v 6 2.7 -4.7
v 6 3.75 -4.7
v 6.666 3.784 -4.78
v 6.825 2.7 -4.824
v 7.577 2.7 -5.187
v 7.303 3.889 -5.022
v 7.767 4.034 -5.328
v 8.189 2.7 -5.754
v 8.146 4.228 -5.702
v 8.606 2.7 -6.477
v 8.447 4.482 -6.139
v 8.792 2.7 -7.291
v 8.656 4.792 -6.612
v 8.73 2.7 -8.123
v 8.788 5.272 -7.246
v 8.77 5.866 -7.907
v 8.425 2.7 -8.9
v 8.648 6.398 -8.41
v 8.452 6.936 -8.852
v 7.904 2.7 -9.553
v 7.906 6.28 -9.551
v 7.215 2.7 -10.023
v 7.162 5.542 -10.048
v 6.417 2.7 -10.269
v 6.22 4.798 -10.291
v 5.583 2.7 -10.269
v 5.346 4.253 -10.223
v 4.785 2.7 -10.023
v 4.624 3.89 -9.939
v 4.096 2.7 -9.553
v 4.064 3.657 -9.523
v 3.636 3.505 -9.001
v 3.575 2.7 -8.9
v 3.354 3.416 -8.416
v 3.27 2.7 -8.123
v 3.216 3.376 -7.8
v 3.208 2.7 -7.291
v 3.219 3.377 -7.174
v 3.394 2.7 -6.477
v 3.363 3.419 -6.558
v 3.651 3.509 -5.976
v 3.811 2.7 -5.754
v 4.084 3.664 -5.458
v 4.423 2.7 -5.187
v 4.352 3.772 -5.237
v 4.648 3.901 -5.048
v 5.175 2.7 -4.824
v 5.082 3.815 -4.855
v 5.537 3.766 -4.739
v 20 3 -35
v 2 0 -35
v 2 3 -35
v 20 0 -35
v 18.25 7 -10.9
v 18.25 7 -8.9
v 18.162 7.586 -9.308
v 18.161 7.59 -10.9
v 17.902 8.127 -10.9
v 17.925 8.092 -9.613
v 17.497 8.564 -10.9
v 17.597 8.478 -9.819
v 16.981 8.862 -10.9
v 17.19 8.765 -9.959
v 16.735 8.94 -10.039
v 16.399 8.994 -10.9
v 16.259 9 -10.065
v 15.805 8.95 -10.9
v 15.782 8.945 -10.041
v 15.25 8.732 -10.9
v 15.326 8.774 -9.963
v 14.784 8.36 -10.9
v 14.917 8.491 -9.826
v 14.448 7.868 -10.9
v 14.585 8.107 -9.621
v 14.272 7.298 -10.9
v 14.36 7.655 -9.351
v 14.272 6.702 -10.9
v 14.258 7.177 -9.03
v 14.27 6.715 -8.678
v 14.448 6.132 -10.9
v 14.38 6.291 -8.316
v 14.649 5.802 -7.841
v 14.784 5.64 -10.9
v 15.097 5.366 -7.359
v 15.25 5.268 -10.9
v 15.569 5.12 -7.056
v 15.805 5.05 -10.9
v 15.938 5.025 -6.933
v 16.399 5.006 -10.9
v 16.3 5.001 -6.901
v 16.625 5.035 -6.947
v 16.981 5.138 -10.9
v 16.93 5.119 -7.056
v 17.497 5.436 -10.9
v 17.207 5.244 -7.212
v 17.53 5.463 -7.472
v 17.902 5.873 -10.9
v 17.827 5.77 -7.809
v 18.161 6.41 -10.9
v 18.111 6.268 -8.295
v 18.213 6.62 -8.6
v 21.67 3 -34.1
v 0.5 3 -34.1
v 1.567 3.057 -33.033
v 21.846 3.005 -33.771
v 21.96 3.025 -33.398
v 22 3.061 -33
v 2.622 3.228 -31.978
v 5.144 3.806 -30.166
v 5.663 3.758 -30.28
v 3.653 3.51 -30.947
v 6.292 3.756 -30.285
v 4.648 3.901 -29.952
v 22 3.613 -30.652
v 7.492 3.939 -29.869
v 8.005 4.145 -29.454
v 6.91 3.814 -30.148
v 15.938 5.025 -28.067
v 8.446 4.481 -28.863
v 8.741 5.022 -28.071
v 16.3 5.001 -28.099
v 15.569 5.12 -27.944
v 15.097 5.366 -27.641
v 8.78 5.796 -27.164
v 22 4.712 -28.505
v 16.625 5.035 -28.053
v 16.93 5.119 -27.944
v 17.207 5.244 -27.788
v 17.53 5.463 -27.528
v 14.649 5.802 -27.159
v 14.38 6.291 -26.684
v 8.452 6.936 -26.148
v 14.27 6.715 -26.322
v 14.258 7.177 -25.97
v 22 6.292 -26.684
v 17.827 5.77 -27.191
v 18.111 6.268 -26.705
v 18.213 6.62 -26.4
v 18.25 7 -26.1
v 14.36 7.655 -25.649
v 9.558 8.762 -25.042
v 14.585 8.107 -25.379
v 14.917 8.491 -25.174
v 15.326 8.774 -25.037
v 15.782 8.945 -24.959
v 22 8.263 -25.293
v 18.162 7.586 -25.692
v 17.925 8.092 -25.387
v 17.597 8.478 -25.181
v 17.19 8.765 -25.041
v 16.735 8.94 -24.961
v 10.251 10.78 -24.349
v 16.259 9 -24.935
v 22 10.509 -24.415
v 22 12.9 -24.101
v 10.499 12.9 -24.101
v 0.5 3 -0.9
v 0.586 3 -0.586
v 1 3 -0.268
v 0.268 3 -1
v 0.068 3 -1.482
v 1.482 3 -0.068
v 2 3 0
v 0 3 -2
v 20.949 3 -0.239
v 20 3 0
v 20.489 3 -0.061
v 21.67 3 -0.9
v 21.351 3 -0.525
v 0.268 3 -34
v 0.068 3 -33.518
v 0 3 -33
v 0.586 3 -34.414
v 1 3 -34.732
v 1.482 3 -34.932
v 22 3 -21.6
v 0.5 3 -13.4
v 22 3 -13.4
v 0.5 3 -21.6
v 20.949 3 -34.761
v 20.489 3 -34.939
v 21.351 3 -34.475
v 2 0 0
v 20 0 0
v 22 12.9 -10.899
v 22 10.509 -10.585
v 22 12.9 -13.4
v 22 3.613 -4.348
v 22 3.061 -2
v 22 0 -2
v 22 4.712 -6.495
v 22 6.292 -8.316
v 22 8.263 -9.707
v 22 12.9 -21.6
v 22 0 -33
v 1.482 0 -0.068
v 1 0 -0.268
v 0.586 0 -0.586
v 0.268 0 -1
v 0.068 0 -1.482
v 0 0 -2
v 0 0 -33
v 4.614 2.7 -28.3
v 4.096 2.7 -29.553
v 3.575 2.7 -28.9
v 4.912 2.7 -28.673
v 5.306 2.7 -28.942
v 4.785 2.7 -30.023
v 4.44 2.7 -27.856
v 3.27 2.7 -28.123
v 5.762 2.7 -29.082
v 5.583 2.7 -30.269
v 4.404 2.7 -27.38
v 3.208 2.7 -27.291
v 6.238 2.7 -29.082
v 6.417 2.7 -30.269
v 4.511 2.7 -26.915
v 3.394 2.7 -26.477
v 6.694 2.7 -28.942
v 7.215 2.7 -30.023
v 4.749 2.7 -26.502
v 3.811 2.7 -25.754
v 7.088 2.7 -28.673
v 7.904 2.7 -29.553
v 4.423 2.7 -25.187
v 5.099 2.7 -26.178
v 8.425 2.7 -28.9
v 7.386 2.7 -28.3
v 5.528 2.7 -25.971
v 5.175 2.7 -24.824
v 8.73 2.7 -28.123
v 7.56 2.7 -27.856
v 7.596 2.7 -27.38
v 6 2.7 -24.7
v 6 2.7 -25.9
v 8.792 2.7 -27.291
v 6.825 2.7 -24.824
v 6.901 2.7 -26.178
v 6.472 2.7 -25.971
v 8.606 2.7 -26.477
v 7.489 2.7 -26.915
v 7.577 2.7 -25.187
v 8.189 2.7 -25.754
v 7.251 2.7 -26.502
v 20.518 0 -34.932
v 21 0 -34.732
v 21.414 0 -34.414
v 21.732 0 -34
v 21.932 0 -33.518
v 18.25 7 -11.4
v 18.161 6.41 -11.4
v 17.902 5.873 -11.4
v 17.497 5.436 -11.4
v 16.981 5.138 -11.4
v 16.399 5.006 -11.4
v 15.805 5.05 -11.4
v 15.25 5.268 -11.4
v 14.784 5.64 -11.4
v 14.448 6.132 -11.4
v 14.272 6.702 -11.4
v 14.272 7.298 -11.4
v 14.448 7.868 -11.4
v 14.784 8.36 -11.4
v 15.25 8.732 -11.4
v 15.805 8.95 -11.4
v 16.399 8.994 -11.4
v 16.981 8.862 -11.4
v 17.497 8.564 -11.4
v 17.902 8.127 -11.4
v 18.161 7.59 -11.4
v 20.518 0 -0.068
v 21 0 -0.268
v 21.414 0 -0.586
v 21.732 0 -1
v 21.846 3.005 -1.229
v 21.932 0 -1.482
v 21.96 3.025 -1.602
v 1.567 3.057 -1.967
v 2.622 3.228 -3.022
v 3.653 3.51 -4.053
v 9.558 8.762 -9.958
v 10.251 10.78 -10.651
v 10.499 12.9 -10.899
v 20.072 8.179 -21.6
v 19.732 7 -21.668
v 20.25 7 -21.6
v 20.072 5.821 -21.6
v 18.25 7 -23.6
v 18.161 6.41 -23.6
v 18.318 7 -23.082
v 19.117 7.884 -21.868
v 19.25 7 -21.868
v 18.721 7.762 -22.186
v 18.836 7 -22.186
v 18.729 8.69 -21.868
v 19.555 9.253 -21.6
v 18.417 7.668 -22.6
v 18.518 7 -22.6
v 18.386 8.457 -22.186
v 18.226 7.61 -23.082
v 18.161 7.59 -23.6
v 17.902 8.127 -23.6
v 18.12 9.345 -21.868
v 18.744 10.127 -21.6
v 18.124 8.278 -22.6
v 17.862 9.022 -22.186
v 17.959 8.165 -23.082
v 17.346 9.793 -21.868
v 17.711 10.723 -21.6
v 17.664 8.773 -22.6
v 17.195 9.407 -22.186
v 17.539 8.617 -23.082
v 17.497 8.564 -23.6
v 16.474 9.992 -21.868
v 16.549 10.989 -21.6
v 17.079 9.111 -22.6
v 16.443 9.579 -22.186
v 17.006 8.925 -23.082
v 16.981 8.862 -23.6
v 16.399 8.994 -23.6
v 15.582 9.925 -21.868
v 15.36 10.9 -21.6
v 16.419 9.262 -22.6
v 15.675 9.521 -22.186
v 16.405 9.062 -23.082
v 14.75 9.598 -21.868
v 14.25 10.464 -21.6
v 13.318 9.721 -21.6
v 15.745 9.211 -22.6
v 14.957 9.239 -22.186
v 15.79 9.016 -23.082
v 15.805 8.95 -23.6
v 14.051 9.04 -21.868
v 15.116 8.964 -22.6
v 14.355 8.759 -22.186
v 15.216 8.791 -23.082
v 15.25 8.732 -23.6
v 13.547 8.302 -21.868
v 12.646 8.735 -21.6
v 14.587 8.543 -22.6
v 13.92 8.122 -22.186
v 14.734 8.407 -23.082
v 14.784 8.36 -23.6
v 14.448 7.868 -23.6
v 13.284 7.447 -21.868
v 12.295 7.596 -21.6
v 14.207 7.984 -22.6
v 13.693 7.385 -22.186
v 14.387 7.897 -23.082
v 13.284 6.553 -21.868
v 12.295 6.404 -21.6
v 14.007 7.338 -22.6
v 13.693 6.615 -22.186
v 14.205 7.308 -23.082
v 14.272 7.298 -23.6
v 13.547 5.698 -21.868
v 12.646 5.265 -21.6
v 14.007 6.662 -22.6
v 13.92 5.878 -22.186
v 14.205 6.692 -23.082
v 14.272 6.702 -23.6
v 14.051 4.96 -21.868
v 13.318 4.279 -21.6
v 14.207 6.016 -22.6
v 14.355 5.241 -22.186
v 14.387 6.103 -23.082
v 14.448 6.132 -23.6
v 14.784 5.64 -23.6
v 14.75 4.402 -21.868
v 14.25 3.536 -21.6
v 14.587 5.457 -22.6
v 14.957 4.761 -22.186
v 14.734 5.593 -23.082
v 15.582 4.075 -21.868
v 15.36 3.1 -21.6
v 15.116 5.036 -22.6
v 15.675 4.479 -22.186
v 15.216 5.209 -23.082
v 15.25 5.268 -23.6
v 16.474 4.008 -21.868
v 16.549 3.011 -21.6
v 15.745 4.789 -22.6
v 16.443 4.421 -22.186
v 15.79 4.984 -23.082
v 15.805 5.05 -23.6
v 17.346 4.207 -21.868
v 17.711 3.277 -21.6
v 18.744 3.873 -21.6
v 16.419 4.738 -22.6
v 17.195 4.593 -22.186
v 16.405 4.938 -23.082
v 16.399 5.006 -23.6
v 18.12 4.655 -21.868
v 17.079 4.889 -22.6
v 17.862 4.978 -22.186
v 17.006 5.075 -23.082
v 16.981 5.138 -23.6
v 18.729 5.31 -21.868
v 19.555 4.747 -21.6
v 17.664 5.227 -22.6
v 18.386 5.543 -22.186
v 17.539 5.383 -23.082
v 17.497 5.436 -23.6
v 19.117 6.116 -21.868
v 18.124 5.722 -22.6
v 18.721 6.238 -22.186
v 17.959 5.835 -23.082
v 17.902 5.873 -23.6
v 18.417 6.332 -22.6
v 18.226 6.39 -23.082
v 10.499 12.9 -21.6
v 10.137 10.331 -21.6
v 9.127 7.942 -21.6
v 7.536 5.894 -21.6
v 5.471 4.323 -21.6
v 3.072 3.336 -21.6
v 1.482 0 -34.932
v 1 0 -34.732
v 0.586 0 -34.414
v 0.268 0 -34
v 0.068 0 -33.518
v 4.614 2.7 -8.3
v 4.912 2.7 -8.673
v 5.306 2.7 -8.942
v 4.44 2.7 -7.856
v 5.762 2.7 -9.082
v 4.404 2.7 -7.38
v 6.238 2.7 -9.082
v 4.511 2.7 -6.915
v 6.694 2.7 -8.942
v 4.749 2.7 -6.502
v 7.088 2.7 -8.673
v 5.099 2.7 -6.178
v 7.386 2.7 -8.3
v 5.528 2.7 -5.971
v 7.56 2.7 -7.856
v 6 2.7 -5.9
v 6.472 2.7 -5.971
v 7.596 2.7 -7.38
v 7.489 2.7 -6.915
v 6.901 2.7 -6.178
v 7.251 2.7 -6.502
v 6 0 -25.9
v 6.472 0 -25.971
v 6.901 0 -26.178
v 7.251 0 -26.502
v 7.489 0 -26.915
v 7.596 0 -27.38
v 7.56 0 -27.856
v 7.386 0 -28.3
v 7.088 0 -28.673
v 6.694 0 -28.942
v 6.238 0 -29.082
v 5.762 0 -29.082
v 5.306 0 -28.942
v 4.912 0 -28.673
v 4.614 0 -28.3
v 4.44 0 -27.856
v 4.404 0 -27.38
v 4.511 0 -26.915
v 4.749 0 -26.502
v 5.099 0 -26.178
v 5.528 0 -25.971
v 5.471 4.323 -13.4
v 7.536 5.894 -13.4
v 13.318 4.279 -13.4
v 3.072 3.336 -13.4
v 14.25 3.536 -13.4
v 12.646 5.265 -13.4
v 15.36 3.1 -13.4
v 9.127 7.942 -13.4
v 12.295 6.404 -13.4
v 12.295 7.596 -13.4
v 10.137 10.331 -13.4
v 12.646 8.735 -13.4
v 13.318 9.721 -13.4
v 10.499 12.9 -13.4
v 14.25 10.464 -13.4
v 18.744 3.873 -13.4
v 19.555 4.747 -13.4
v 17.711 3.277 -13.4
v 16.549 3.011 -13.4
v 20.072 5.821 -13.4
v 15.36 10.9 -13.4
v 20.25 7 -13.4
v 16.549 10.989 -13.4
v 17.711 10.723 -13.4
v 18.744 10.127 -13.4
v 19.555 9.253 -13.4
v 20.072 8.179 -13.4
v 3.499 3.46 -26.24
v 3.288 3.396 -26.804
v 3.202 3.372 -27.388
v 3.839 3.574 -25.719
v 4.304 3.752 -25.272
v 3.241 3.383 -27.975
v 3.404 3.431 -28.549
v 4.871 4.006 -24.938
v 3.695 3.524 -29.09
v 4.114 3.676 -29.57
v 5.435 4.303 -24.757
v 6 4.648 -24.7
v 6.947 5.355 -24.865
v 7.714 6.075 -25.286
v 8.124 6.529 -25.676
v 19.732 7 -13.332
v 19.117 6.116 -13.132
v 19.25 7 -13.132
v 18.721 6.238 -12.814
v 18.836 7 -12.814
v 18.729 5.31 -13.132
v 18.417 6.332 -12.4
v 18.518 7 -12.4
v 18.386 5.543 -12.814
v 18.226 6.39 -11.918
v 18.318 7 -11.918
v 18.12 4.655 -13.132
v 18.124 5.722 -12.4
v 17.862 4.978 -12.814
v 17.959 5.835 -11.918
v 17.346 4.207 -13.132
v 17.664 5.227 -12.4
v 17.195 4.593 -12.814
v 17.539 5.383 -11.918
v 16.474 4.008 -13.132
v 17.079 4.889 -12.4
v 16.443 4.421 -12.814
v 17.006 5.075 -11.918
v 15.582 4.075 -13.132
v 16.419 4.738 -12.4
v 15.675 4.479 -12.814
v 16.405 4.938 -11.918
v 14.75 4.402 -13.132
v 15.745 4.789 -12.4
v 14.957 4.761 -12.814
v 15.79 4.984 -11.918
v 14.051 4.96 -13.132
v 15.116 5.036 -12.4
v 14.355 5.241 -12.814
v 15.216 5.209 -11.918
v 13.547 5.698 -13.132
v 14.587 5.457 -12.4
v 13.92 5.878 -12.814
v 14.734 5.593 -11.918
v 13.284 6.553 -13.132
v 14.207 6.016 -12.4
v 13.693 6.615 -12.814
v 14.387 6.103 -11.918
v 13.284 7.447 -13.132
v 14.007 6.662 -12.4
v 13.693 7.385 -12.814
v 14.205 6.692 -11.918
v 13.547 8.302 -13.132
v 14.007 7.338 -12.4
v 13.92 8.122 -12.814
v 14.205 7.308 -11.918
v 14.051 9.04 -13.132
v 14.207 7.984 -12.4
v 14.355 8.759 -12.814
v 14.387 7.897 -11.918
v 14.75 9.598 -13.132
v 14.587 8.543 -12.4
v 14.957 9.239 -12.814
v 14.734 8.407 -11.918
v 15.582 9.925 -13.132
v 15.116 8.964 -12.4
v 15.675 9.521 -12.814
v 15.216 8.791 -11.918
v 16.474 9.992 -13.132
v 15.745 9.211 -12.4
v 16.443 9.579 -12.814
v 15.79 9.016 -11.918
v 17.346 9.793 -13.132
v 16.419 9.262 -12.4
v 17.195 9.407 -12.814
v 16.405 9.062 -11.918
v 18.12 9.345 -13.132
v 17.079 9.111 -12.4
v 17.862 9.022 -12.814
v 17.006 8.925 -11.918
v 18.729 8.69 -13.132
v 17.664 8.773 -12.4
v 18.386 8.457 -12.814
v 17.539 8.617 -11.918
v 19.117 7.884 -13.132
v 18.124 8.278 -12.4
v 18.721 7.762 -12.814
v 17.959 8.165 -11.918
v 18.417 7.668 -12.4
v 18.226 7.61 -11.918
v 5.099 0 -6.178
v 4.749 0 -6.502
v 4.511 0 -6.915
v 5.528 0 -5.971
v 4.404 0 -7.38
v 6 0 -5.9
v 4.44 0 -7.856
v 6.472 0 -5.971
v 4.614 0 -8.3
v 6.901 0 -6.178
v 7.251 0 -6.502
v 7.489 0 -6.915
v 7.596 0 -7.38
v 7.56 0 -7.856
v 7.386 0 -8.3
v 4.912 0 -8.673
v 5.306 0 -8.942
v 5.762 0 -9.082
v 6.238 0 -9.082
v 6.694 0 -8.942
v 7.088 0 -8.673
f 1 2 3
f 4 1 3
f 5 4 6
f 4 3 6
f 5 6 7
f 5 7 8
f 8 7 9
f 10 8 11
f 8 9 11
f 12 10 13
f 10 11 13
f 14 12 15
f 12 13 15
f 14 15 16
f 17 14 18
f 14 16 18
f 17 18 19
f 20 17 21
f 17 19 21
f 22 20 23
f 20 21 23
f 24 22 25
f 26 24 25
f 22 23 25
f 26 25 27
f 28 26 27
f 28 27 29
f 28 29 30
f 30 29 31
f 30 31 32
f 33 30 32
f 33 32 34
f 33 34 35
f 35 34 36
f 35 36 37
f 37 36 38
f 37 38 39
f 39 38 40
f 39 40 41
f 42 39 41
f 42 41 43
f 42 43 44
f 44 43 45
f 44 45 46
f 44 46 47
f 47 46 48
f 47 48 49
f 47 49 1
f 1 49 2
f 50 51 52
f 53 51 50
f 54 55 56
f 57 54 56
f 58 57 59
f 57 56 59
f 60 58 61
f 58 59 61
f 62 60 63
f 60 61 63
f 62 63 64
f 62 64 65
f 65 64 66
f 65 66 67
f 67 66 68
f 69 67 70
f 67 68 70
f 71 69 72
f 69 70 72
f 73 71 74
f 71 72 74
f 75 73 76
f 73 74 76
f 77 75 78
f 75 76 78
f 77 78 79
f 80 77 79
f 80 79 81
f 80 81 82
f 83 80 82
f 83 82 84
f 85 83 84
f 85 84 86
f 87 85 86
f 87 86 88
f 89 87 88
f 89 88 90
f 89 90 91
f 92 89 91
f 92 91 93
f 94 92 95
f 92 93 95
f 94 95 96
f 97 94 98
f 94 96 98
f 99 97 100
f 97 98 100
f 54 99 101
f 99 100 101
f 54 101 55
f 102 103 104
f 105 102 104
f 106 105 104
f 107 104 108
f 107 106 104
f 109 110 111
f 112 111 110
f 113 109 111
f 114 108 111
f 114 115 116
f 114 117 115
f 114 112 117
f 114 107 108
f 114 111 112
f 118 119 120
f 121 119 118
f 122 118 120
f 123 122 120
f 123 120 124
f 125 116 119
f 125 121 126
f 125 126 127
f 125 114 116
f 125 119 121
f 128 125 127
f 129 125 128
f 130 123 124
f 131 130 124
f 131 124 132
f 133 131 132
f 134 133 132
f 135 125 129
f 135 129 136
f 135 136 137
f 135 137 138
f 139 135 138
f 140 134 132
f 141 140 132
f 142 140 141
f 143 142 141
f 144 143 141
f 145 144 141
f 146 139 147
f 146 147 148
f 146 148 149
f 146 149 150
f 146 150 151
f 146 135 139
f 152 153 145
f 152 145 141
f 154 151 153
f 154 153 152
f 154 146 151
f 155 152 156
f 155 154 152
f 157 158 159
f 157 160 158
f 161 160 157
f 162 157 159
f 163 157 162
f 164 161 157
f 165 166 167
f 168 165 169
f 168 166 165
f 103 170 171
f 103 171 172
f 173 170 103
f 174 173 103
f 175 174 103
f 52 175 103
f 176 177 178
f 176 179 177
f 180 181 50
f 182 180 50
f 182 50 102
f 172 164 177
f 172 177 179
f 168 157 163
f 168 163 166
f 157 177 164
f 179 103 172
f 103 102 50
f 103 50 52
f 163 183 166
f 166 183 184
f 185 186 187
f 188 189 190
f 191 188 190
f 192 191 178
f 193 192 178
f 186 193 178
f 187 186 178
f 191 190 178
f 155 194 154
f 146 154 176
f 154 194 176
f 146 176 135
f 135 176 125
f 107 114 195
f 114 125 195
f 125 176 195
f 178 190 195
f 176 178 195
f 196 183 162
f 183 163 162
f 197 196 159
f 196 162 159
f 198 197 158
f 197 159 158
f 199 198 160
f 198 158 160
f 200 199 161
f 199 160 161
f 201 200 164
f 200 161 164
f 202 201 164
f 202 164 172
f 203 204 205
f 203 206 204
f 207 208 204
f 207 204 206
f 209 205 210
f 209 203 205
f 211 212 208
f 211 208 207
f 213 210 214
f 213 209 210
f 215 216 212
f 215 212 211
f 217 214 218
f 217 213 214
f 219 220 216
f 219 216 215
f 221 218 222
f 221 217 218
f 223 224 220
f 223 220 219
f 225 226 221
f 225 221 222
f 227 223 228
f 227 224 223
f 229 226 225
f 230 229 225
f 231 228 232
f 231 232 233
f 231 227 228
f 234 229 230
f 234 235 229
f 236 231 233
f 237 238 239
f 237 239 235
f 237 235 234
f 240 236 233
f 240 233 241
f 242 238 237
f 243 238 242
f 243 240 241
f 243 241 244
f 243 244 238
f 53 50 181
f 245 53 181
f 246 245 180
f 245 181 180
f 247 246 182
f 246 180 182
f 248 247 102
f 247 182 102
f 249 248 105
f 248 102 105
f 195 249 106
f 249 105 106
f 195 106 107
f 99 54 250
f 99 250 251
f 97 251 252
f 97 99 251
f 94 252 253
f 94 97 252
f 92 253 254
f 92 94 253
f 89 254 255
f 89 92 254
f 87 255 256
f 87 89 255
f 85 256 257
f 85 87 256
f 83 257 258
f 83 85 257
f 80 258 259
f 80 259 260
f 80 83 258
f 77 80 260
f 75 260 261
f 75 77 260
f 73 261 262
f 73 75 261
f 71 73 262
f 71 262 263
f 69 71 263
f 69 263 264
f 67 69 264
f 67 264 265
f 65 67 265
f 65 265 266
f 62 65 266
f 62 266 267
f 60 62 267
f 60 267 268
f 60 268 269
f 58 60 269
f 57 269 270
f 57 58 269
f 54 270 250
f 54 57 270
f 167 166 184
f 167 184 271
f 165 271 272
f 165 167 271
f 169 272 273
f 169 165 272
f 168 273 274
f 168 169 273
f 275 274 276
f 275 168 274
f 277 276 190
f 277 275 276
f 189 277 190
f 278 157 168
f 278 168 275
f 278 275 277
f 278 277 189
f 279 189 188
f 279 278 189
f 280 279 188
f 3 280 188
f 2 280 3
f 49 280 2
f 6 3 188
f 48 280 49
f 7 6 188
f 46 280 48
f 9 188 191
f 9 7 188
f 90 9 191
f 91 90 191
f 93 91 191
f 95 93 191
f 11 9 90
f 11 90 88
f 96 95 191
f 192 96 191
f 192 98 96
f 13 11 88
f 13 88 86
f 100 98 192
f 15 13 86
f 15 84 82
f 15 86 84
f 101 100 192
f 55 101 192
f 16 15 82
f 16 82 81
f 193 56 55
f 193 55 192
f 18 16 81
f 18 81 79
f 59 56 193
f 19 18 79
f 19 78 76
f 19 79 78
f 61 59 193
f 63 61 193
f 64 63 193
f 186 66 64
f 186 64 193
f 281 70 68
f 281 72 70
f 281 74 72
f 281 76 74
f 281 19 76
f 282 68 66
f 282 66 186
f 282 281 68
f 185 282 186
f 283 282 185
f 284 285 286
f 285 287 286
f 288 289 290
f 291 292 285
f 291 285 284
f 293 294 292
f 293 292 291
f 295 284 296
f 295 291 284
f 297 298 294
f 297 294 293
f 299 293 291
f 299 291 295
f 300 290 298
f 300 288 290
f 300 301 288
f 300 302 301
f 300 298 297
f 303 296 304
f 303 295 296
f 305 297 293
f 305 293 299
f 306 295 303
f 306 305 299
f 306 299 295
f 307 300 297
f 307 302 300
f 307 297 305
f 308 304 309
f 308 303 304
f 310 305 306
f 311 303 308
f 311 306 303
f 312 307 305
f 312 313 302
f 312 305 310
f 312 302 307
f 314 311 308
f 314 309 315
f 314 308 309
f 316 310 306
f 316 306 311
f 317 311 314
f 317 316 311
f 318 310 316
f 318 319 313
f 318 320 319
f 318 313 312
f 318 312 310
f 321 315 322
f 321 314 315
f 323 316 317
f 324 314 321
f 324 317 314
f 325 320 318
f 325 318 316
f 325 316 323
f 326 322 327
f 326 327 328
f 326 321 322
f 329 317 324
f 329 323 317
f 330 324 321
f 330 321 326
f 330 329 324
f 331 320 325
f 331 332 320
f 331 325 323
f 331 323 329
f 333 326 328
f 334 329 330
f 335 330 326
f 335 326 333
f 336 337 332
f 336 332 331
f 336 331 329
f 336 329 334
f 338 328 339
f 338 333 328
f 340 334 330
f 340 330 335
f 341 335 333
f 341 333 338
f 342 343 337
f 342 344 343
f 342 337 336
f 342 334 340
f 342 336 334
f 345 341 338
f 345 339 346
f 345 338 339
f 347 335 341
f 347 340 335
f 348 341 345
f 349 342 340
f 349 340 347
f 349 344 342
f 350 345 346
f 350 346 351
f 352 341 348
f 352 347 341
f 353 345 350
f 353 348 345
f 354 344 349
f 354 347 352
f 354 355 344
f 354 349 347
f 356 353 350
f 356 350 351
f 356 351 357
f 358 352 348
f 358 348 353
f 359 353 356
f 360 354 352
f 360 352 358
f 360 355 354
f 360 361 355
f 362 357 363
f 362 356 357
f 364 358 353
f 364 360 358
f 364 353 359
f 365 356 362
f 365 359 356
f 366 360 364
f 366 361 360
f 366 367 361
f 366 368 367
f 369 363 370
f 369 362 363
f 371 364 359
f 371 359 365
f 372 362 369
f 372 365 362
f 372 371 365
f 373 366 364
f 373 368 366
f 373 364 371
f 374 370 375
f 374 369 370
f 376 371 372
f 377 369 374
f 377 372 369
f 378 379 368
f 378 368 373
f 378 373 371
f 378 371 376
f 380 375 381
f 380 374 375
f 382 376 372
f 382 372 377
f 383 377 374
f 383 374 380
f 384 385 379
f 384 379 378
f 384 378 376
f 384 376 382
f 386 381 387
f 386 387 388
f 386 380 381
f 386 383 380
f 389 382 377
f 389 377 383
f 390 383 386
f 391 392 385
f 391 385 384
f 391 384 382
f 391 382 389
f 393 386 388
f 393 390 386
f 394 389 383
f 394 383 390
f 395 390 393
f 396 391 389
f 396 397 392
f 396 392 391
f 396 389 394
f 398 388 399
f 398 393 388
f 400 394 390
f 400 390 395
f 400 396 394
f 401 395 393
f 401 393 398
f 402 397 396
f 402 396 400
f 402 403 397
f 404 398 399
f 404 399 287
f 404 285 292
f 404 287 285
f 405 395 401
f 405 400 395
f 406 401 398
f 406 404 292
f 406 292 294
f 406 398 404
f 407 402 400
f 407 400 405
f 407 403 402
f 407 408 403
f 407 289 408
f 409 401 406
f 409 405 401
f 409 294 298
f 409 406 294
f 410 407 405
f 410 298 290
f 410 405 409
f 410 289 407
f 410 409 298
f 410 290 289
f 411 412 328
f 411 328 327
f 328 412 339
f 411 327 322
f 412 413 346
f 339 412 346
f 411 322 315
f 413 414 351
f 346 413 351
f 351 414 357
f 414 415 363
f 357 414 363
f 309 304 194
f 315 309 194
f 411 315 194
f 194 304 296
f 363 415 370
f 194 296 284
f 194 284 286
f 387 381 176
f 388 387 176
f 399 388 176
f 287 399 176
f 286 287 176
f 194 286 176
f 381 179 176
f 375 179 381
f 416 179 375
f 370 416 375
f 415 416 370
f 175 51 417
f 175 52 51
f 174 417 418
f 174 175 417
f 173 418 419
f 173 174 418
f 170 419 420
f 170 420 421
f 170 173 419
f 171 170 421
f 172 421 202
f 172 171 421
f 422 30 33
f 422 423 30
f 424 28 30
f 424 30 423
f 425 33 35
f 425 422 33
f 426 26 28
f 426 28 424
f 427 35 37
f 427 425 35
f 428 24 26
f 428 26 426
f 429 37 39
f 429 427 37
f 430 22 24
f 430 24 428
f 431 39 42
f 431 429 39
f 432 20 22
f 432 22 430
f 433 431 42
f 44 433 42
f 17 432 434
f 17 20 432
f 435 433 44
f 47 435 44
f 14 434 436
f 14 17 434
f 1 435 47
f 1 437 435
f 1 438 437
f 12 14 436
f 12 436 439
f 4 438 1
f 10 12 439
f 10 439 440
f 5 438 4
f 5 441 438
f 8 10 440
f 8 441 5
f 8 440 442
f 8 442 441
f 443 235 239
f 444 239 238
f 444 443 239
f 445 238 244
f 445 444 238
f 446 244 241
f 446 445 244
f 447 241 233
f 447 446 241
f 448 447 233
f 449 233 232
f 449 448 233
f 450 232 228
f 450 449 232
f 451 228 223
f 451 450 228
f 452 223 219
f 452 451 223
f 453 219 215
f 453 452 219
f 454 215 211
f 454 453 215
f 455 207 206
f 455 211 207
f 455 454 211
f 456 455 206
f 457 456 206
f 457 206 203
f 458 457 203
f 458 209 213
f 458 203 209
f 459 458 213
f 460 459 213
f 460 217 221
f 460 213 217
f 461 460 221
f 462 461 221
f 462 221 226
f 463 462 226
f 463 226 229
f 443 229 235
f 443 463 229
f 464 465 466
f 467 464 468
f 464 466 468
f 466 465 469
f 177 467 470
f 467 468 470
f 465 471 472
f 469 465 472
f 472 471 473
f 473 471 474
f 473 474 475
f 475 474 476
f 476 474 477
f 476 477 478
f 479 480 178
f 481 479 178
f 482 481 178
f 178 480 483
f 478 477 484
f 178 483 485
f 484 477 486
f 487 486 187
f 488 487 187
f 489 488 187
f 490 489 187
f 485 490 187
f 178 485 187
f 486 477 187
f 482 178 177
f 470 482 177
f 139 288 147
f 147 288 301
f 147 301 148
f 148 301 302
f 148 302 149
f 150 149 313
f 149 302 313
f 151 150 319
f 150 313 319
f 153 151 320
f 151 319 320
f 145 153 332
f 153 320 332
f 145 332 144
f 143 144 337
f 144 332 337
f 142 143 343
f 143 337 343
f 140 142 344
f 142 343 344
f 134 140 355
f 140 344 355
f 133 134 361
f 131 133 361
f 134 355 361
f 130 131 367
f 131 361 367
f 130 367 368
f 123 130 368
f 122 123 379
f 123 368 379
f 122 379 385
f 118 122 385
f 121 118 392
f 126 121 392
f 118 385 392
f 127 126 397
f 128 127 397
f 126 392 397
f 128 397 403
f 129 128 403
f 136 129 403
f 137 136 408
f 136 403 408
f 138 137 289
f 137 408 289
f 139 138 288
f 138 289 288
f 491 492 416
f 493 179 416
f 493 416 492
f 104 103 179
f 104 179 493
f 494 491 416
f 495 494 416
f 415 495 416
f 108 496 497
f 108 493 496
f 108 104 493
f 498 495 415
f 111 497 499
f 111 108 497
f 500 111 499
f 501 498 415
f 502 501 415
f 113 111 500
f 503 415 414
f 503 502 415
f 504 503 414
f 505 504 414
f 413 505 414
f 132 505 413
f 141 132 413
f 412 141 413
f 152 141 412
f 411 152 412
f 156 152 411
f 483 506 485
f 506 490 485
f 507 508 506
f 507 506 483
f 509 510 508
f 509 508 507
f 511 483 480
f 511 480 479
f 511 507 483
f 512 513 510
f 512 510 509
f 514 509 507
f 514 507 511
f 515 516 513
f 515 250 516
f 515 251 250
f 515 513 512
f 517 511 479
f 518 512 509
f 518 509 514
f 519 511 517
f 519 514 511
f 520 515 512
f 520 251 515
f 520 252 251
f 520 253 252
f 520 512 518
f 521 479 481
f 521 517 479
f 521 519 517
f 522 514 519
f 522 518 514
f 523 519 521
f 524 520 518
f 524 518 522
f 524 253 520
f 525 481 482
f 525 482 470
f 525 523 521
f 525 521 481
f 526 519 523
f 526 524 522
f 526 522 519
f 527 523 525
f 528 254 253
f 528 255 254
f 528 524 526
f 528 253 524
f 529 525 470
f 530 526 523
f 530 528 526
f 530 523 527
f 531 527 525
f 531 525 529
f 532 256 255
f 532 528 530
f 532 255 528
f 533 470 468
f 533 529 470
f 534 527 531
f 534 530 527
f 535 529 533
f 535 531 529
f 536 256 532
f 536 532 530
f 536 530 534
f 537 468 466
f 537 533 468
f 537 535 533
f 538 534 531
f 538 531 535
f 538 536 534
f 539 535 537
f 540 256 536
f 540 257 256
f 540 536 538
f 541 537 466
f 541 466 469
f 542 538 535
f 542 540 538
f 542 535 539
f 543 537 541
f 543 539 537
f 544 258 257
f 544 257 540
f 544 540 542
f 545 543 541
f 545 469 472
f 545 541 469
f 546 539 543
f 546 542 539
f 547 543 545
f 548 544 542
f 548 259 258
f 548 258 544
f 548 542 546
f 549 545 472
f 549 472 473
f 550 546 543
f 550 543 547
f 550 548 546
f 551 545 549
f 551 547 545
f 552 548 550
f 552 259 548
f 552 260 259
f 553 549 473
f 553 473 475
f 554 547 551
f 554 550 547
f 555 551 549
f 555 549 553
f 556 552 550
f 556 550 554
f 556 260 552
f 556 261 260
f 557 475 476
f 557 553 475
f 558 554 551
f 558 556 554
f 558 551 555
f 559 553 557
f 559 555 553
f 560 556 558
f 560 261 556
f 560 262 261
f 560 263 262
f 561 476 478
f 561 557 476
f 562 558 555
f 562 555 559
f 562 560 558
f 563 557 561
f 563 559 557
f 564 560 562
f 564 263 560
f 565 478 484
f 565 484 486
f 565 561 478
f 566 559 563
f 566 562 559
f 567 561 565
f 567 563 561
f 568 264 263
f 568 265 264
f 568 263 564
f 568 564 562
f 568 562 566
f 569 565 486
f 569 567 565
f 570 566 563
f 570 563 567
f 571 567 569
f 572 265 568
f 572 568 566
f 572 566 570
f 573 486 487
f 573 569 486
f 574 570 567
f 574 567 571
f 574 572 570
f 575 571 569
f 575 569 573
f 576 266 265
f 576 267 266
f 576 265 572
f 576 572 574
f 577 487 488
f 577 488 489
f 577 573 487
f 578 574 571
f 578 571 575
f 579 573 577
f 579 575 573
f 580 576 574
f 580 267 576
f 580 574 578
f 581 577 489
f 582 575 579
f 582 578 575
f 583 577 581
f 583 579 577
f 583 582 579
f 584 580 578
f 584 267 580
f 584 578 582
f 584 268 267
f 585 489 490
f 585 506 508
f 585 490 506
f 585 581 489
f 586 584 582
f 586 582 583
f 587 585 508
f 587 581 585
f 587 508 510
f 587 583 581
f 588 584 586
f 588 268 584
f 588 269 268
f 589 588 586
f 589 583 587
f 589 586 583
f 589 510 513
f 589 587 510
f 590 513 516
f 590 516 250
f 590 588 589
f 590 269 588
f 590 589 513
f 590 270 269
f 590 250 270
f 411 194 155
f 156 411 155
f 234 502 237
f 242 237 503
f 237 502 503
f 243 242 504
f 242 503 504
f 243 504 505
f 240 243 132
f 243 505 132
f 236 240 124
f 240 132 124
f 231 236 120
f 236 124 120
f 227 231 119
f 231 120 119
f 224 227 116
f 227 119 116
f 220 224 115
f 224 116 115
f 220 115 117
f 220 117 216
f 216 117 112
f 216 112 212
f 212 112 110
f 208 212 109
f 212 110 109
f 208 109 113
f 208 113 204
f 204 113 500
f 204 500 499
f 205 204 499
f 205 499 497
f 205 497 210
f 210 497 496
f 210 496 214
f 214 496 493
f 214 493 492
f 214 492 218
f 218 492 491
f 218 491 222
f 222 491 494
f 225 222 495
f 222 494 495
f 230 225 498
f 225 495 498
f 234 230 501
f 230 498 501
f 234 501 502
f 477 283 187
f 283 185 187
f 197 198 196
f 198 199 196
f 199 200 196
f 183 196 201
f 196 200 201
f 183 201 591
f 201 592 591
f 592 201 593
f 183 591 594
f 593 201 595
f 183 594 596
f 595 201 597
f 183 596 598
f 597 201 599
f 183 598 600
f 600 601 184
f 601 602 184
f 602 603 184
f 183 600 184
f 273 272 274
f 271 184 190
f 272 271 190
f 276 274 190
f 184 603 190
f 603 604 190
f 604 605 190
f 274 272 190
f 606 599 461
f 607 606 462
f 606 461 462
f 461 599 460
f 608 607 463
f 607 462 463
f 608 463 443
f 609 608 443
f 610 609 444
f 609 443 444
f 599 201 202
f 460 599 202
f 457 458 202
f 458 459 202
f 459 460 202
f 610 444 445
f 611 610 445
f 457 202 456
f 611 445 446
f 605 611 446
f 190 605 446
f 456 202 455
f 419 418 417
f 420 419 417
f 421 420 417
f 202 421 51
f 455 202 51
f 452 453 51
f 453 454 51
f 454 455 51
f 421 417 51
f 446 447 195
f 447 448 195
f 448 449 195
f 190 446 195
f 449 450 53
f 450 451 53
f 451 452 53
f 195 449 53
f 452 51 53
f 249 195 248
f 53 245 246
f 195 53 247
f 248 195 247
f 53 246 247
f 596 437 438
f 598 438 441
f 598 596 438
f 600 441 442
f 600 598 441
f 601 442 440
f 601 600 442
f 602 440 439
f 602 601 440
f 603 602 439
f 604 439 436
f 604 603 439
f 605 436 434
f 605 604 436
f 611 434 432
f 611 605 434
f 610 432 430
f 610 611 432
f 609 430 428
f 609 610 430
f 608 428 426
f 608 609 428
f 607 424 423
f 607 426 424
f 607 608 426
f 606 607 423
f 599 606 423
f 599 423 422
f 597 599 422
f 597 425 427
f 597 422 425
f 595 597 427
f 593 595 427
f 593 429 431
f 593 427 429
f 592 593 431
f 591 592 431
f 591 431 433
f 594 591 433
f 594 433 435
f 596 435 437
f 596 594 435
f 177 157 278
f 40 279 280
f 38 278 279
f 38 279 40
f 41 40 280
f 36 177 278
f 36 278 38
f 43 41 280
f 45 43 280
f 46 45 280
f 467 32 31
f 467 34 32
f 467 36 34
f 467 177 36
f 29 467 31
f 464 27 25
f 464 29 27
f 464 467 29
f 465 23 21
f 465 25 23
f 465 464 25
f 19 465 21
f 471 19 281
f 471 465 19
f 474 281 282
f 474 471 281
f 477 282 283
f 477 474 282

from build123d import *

# Parameters (mm, degrees)
CROQUIS1_W              = 22
CROQUIS1_H              = 35
CROQUIS1_R              = 1.6
SALIENTE_EXTRUIR1_DEPTH = 3
CROQUIS2_W              = 11.5
CROQUIS2_H              = 2.5
SALIENTE_EXTRUIR2_DEPTH = 9.9
CROQUIS4_R              = 2
CORTAR_EXTRUIR1_DEPTH   = 2.5
CORTAR_EXTRUIR2_START   = -2.5
CROQUIS5_R              = 2
CORTAR_EXTRUIR2_DEPTH   = 2.5
CROQUIS6_R              = 2.8
CORTAR_EXTRUIR3_DEPTH   = 0.3
REDONDEO1_R             = 2
REDONDEO2_R             = 10
REDONDEO4_R             = 2


# Some blends are built 0.0001 mm under size
with BuildPart() as part:
    # Croquis1 → Saliente-Extruir1 (new body)
    with BuildSketch(Plane(origin=(0, 0, 0), x_dir=(1, 0, 0), z_dir=(0, 1, 0))):
        with Locations((11, 17.5)):
            Rectangle(CROQUIS1_W, CROQUIS1_H)
        with Locations(Location((6, 27.5, 0), (0, 0, 270))):
            Circle(CROQUIS1_R, mode=Mode.SUBTRACT)
        with Locations(Location((6, 7.5, 0), (0, 0, 270))):
            Circle(CROQUIS1_R, mode=Mode.SUBTRACT)
    extrude(amount=SALIENTE_EXTRUIR1_DEPTH)

    # Croquis2 → Saliente-Extruir2 (add)
    with BuildSketch(Plane(origin=(0, 3, 0), x_dir=(1, 0, 0), z_dir=(0, 1, 0))):
        with Locations((16.25, 22.85)):
            Rectangle(CROQUIS2_W, CROQUIS2_H)
        with Locations((16.25, 12.15)):
            Rectangle(CROQUIS2_W, CROQUIS2_H)
    extrude(amount=SALIENTE_EXTRUIR2_DEPTH)

    # Croquis4 → Cortar-Extruir1 (cut)
    with BuildSketch(Plane.XY.offset(-21.6)):
        with Locations((16.25, 7)):
            Circle(CROQUIS4_R)
    extrude(amount=-CORTAR_EXTRUIR1_DEPTH, mode=Mode.SUBTRACT)

    # Croquis5 → Cortar-Extruir2 (cut)
    with BuildSketch(Plane(origin=(0, 0, -13.4), x_dir=(-1, 0, 0), z_dir=(0, 0, -1)).offset(CORTAR_EXTRUIR2_START)):
        with Locations(Location((-16.25, 7, 0), (0, 0, 180))):
            Circle(CROQUIS5_R)
    extrude(amount=CORTAR_EXTRUIR2_DEPTH, mode=Mode.SUBTRACT)

    # Croquis6 → Cortar-Extruir3 (cut)
    with BuildSketch(Plane(origin=(0, 3, 0), x_dir=(1, 0, 0), z_dir=(0, 1, 0))):
        with Locations(Location((6, 7.5, 0), (0, 0, 270))):
            Circle(CROQUIS6_R)
        with Locations(Location((6, 27.5, 0), (0, 0, 270))):
            Circle(CROQUIS6_R)
    extrude(amount=-CORTAR_EXTRUIR3_DEPTH, mode=Mode.SUBTRACT)

    # Redondeo1
    redondeo1_edges = [part.edges().sort_by_distance(p)[0] for p in [
        (14.25, 7, -21.6),
        (14.25, 7, -13.4),
    ]]
    fillet(redondeo1_edges, radius=REDONDEO1_R - 0.0001)  # a hair under: the kernel refuses the full size

    # Redondeo2
    # the kernel refuses this fillet: 10 mm, written as the material it adds along each edge
    with BuildSketch(Plane(origin=(22, 3, -24.1), x_dir=(0, 0, -1), z_dir=(-1, 0, 0))) as redondeo2_piece_1_section:
        with BuildLine():
            CenterArc((REDONDEO2_R, -REDONDEO2_R), REDONDEO2_R, 90, 90)
            Line((0, -REDONDEO2_R), (0, 0))
            Line((0, 0), (REDONDEO2_R, 0))
        make_face()
    redondeo2_piece_1 = extrude(amount=11.5, mode=Mode.PRIVATE)
    redondeo2_piece_1 = split(redondeo2_piece_1, bisect_by=Plane(origin=(12.416666667, 12.9, -31.511409781), z_dir=(0, -1, 0)), keep=Keep.TOP, mode=Mode.PRIVATE)
    redondeo2_piece_1 = redondeo2_piece_1 - Plane(origin=(16.25, 7, -31.511409781), x_dir=(1, 0, 0), z_dir=(0, 0, 1)) * Cylinder(2, 63, mode=Mode.PRIVATE)
    add(redondeo2_piece_1)
    with BuildSketch(Plane(origin=(10.5, 3, -24.1), x_dir=(-1, 0, 0), z_dir=(0, 0, 1))) as redondeo2_piece_2_section:
        with BuildLine():
            CenterArc((REDONDEO2_R, -REDONDEO2_R), REDONDEO2_R, 90, 90)
            Line((0, -REDONDEO2_R), (0, 0))
            Line((0, 0), (REDONDEO2_R, 0))
        make_face()
    redondeo2_piece_2 = extrude(amount=2.5, mode=Mode.PRIVATE)
    redondeo2_piece_2 = split(redondeo2_piece_2, bisect_by=Plane(origin=(8.234191854, 12.9, -22.85), z_dir=(0, -1, 0)), keep=Keep.TOP, mode=Mode.PRIVATE)
    add(redondeo2_piece_2)
    with BuildSketch(Plane(origin=(10.5, 3, -24.1), x_dir=(-1, 0, 0), z_dir=(0, 0, 1))) as redondeo2_piece_3_section:
        with BuildLine():
            CenterArc((REDONDEO2_R, -REDONDEO2_R), REDONDEO2_R, 90, 90)
            Line((0, -REDONDEO2_R), (0, 0))
            Line((0, 0), (REDONDEO2_R, 0))
        make_face()
    redondeo2_piece_3 = extrude(amount=27.5, mode=Mode.PRIVATE)
    redondeo2_piece_3 = split(redondeo2_piece_3, bisect_by=Plane(origin=(8.234191854, 5.257913166, -13.4), z_dir=(0, 0, 1)), keep=Keep.TOP, mode=Mode.PRIVATE)
    redondeo2_piece_3 = split(redondeo2_piece_3, bisect_by=Plane(origin=(8.234191854, 12.9, -12.15), z_dir=(0, -1, 0)), keep=Keep.TOP, mode=Mode.PRIVATE)
    redondeo2_piece_3 = split(redondeo2_piece_3, bisect_by=Plane(origin=(8.234191854, 5.257913166, -10.9), z_dir=(0, 0, -1)), keep=Keep.TOP, mode=Mode.PRIVATE)
    add(redondeo2_piece_3)
    with BuildSketch(Plane(origin=(10.5, 3, -38.4), x_dir=(-1, 0, 0), z_dir=(0, 0, 1))) as redondeo2_piece_4_section:
        with BuildLine():
            CenterArc((REDONDEO2_R, -REDONDEO2_R), REDONDEO2_R, 90, 90)
            Line((0, -REDONDEO2_R), (0, 0))
            Line((0, 0), (REDONDEO2_R, 0))
        make_face()
    redondeo2_piece_4 = extrude(amount=27.5, mode=Mode.PRIVATE)
    redondeo2_piece_4 = split(redondeo2_piece_4, bisect_by=Plane(origin=(8.234191854, 12.9, -22.85), z_dir=(0, -1, 0)), keep=Keep.TOP, mode=Mode.PRIVATE)
    redondeo2_piece_4 = split(redondeo2_piece_4, bisect_by=Plane(origin=(8.234191854, 5.257913166, -21.6), z_dir=(0, 0, -1)), keep=Keep.TOP, mode=Mode.PRIVATE)
    redondeo2_piece_4 = split(redondeo2_piece_4, bisect_by=Plane(origin=(8.234191854, 5.257913166, -24.1), z_dir=(0, 0, 1)), keep=Keep.TOP, mode=Mode.PRIVATE)
    add(redondeo2_piece_4)
    with BuildSketch(Plane(origin=(10.5, 3, -13.4), x_dir=(-1, 0, 0), z_dir=(0, 0, 1))) as redondeo2_piece_5_section:
        with BuildLine():
            CenterArc((REDONDEO2_R, -REDONDEO2_R), REDONDEO2_R, 90, 90)
            Line((0, -REDONDEO2_R), (0, 0))
            Line((0, 0), (REDONDEO2_R, 0))
        make_face()
    redondeo2_piece_5 = extrude(amount=2.5, mode=Mode.PRIVATE)
    redondeo2_piece_5 = split(redondeo2_piece_5, bisect_by=Plane(origin=(8.234191854, 12.9, -12.15), z_dir=(0, -1, 0)), keep=Keep.TOP, mode=Mode.PRIVATE)
    add(redondeo2_piece_5)
    with BuildSketch(Plane(origin=(10.5, 3, -10.9), x_dir=(0, 0, 1), z_dir=(1, 0, 0))) as redondeo2_piece_6_section:
        with BuildLine():
            CenterArc((REDONDEO2_R, -REDONDEO2_R), REDONDEO2_R, 90, 90)
            Line((0, -REDONDEO2_R), (0, 0))
            Line((0, 0), (REDONDEO2_R, 0))
        make_face()
    redondeo2_piece_6 = extrude(amount=11.5, mode=Mode.PRIVATE)
    redondeo2_piece_6 = split(redondeo2_piece_6, bisect_by=Plane(origin=(20.083333333, 12.9, -3.488590219), z_dir=(0, -1, 0)), keep=Keep.TOP, mode=Mode.PRIVATE)
    redondeo2_piece_6 = redondeo2_piece_6 - Plane(origin=(16.25, 7, -3.488590219), x_dir=(1, 0, 0), z_dir=(0, 0, 1)) * Cylinder(2, 63, mode=Mode.PRIVATE)
    add(redondeo2_piece_6)
    with BuildSketch(Plane(origin=(22, 3, -24.1), x_dir=(0, 0, -1), z_dir=(-1, 0, 0))) as redondeo2_piece_7a_section:
        with BuildLine():
            CenterArc((REDONDEO2_R, -REDONDEO2_R), REDONDEO2_R, 90, 90)
            Line((0, -REDONDEO2_R), (0, 0))
            Line((0, 0), (REDONDEO2_R, 0))
        make_face()
    redondeo2_piece_7a = extrude(amount=36.5, mode=Mode.PRIVATE)
    redondeo2_piece_7a = split(redondeo2_piece_7a, bisect_by=Plane(origin=(0, 3.280401031, -31.512996252), z_dir=(1, 0, 0)), keep=Keep.TOP, mode=Mode.PRIVATE)
    redondeo2_piece_7a = redondeo2_piece_7a - Plane(origin=(6, 3.280401031, -27.5), x_dir=(0, 0, 1), z_dir=(0, 1, 0)) * Cylinder(2.8, 113, mode=Mode.PRIVATE)
    redondeo2_piece_7a = split(redondeo2_piece_7a, bisect_by=Plane(origin=(1.75, 12.9, -31.512996252), z_dir=(0, -1, 0)), keep=Keep.TOP, mode=Mode.PRIVATE)
    redondeo2_piece_7a = split(redondeo2_piece_7a, bisect_by=Plane(origin=(10.5, 3.280401031, -31.512996252), z_dir=(-1, 0, 0)), keep=Keep.TOP, mode=Mode.PRIVATE)
    with BuildSketch(Plane(origin=(10.5, 3, -49.1), x_dir=(-1, 0, 0), z_dir=(0, 0, 1))) as redondeo2_piece_7b_section:
        with BuildLine():
            CenterArc((REDONDEO2_R, -REDONDEO2_R), REDONDEO2_R, 90, 90)
            Line((0, -REDONDEO2_R), (0, 0))
            Line((0, 0), (REDONDEO2_R, 0))
        make_face()
    redondeo2_piece_7b = extrude(amount=27.5, mode=Mode.PRIVATE)
    redondeo2_piece_7b = split(redondeo2_piece_7b, bisect_by=Plane(origin=(8.577465214, 5.522304582, -35), z_dir=(0, 0, 1)), keep=Keep.TOP, mode=Mode.PRIVATE)
    redondeo2_piece_7b = redondeo2_piece_7b - Plane(origin=(6, 5.522304582, -27.5), x_dir=(0, 0, 1), z_dir=(0, 1, 0)) * Cylinder(2.8, 95, mode=Mode.PRIVATE)
    redondeo2_piece_7b = split(redondeo2_piece_7b, bisect_by=Plane(origin=(8.577465214, 12.9, -29.998804987), z_dir=(0, -1, 0)), keep=Keep.TOP, mode=Mode.PRIVATE)
    redondeo2_piece_7b = split(redondeo2_piece_7b, bisect_by=Plane(origin=(8.577465214, 5.522304582, -24.1), z_dir=(0, 0, -1)), keep=Keep.TOP, mode=Mode.PRIVATE)
    redondeo2_piece_7 = redondeo2_piece_7a & redondeo2_piece_7b
    add(redondeo2_piece_7)
    with BuildSketch(Plane(origin=(-14.5, 3, -10.9), x_dir=(0, 0, 1), z_dir=(1, 0, 0))) as redondeo2_piece_8a_section:
        with BuildLine():
            CenterArc((REDONDEO2_R, -REDONDEO2_R), REDONDEO2_R, 90, 90)
            Line((0, -REDONDEO2_R), (0, 0))
            Line((0, 0), (REDONDEO2_R, 0))
        make_face()
    redondeo2_piece_8a = extrude(amount=36.5, mode=Mode.PRIVATE)
    redondeo2_piece_8a = split(redondeo2_piece_8a, bisect_by=Plane(origin=(0, 3.280397801, -3.487004608), z_dir=(1, 0, 0)), keep=Keep.TOP, mode=Mode.PRIVATE)
    redondeo2_piece_8a = redondeo2_piece_8a - Plane(origin=(6, 3.280397801, -7.5), x_dir=(0, 0, 1), z_dir=(0, 1, 0)) * Cylinder(2.8, 113, mode=Mode.PRIVATE)
    redondeo2_piece_8a = split(redondeo2_piece_8a, bisect_by=Plane(origin=(8.75, 12.9, -3.487004608), z_dir=(0, -1, 0)), keep=Keep.TOP, mode=Mode.PRIVATE)
    redondeo2_piece_8a = split(redondeo2_piece_8a, bisect_by=Plane(origin=(10.5, 3.280397801, -3.487004608), z_dir=(-1, 0, 0)), keep=Keep.TOP, mode=Mode.PRIVATE)
    with BuildSketch(Plane(origin=(10.5, 3, -13.4), x_dir=(-1, 0, 0), z_dir=(0, 0, 1))) as redondeo2_piece_8b_section:
        with BuildLine():
            CenterArc((REDONDEO2_R, -REDONDEO2_R), REDONDEO2_R, 90, 90)
            Line((0, -REDONDEO2_R), (0, 0))
            Line((0, 0), (REDONDEO2_R, 0))
        make_face()
    redondeo2_piece_8b = extrude(amount=27.5, mode=Mode.PRIVATE)
    redondeo2_piece_8b = split(redondeo2_piece_8b, bisect_by=Plane(origin=(8.577464667, 5.522304516, 0), z_dir=(0, 0, -1)), keep=Keep.TOP, mode=Mode.PRIVATE)
    redondeo2_piece_8b = redondeo2_piece_8b - Plane(origin=(6, 5.522304516, -7.5), x_dir=(0, 0, 1), z_dir=(0, 1, 0)) * Cylinder(2.8, 95, mode=Mode.PRIVATE)
    redondeo2_piece_8b = split(redondeo2_piece_8b, bisect_by=Plane(origin=(8.577464667, 12.9, -5.00119928), z_dir=(0, -1, 0)), keep=Keep.TOP, mode=Mode.PRIVATE)
    redondeo2_piece_8b = split(redondeo2_piece_8b, bisect_by=Plane(origin=(8.577464667, 5.522304516, -10.9), z_dir=(0, 0, 1)), keep=Keep.TOP, mode=Mode.PRIVATE)
    redondeo2_piece_8 = redondeo2_piece_8a & redondeo2_piece_8b
    add(redondeo2_piece_8)

    # Redondeo4
    redondeo4_edges = [part.edges().sort_by_distance(p)[0] for p in [
        (0, 1.5, -35),
        (0, 1.5, 0),
        (22, 1.5, 0),
        (22, 1.5, -35),
    ]]
    fillet(redondeo4_edges, radius=REDONDEO4_R)


solid = part.part
